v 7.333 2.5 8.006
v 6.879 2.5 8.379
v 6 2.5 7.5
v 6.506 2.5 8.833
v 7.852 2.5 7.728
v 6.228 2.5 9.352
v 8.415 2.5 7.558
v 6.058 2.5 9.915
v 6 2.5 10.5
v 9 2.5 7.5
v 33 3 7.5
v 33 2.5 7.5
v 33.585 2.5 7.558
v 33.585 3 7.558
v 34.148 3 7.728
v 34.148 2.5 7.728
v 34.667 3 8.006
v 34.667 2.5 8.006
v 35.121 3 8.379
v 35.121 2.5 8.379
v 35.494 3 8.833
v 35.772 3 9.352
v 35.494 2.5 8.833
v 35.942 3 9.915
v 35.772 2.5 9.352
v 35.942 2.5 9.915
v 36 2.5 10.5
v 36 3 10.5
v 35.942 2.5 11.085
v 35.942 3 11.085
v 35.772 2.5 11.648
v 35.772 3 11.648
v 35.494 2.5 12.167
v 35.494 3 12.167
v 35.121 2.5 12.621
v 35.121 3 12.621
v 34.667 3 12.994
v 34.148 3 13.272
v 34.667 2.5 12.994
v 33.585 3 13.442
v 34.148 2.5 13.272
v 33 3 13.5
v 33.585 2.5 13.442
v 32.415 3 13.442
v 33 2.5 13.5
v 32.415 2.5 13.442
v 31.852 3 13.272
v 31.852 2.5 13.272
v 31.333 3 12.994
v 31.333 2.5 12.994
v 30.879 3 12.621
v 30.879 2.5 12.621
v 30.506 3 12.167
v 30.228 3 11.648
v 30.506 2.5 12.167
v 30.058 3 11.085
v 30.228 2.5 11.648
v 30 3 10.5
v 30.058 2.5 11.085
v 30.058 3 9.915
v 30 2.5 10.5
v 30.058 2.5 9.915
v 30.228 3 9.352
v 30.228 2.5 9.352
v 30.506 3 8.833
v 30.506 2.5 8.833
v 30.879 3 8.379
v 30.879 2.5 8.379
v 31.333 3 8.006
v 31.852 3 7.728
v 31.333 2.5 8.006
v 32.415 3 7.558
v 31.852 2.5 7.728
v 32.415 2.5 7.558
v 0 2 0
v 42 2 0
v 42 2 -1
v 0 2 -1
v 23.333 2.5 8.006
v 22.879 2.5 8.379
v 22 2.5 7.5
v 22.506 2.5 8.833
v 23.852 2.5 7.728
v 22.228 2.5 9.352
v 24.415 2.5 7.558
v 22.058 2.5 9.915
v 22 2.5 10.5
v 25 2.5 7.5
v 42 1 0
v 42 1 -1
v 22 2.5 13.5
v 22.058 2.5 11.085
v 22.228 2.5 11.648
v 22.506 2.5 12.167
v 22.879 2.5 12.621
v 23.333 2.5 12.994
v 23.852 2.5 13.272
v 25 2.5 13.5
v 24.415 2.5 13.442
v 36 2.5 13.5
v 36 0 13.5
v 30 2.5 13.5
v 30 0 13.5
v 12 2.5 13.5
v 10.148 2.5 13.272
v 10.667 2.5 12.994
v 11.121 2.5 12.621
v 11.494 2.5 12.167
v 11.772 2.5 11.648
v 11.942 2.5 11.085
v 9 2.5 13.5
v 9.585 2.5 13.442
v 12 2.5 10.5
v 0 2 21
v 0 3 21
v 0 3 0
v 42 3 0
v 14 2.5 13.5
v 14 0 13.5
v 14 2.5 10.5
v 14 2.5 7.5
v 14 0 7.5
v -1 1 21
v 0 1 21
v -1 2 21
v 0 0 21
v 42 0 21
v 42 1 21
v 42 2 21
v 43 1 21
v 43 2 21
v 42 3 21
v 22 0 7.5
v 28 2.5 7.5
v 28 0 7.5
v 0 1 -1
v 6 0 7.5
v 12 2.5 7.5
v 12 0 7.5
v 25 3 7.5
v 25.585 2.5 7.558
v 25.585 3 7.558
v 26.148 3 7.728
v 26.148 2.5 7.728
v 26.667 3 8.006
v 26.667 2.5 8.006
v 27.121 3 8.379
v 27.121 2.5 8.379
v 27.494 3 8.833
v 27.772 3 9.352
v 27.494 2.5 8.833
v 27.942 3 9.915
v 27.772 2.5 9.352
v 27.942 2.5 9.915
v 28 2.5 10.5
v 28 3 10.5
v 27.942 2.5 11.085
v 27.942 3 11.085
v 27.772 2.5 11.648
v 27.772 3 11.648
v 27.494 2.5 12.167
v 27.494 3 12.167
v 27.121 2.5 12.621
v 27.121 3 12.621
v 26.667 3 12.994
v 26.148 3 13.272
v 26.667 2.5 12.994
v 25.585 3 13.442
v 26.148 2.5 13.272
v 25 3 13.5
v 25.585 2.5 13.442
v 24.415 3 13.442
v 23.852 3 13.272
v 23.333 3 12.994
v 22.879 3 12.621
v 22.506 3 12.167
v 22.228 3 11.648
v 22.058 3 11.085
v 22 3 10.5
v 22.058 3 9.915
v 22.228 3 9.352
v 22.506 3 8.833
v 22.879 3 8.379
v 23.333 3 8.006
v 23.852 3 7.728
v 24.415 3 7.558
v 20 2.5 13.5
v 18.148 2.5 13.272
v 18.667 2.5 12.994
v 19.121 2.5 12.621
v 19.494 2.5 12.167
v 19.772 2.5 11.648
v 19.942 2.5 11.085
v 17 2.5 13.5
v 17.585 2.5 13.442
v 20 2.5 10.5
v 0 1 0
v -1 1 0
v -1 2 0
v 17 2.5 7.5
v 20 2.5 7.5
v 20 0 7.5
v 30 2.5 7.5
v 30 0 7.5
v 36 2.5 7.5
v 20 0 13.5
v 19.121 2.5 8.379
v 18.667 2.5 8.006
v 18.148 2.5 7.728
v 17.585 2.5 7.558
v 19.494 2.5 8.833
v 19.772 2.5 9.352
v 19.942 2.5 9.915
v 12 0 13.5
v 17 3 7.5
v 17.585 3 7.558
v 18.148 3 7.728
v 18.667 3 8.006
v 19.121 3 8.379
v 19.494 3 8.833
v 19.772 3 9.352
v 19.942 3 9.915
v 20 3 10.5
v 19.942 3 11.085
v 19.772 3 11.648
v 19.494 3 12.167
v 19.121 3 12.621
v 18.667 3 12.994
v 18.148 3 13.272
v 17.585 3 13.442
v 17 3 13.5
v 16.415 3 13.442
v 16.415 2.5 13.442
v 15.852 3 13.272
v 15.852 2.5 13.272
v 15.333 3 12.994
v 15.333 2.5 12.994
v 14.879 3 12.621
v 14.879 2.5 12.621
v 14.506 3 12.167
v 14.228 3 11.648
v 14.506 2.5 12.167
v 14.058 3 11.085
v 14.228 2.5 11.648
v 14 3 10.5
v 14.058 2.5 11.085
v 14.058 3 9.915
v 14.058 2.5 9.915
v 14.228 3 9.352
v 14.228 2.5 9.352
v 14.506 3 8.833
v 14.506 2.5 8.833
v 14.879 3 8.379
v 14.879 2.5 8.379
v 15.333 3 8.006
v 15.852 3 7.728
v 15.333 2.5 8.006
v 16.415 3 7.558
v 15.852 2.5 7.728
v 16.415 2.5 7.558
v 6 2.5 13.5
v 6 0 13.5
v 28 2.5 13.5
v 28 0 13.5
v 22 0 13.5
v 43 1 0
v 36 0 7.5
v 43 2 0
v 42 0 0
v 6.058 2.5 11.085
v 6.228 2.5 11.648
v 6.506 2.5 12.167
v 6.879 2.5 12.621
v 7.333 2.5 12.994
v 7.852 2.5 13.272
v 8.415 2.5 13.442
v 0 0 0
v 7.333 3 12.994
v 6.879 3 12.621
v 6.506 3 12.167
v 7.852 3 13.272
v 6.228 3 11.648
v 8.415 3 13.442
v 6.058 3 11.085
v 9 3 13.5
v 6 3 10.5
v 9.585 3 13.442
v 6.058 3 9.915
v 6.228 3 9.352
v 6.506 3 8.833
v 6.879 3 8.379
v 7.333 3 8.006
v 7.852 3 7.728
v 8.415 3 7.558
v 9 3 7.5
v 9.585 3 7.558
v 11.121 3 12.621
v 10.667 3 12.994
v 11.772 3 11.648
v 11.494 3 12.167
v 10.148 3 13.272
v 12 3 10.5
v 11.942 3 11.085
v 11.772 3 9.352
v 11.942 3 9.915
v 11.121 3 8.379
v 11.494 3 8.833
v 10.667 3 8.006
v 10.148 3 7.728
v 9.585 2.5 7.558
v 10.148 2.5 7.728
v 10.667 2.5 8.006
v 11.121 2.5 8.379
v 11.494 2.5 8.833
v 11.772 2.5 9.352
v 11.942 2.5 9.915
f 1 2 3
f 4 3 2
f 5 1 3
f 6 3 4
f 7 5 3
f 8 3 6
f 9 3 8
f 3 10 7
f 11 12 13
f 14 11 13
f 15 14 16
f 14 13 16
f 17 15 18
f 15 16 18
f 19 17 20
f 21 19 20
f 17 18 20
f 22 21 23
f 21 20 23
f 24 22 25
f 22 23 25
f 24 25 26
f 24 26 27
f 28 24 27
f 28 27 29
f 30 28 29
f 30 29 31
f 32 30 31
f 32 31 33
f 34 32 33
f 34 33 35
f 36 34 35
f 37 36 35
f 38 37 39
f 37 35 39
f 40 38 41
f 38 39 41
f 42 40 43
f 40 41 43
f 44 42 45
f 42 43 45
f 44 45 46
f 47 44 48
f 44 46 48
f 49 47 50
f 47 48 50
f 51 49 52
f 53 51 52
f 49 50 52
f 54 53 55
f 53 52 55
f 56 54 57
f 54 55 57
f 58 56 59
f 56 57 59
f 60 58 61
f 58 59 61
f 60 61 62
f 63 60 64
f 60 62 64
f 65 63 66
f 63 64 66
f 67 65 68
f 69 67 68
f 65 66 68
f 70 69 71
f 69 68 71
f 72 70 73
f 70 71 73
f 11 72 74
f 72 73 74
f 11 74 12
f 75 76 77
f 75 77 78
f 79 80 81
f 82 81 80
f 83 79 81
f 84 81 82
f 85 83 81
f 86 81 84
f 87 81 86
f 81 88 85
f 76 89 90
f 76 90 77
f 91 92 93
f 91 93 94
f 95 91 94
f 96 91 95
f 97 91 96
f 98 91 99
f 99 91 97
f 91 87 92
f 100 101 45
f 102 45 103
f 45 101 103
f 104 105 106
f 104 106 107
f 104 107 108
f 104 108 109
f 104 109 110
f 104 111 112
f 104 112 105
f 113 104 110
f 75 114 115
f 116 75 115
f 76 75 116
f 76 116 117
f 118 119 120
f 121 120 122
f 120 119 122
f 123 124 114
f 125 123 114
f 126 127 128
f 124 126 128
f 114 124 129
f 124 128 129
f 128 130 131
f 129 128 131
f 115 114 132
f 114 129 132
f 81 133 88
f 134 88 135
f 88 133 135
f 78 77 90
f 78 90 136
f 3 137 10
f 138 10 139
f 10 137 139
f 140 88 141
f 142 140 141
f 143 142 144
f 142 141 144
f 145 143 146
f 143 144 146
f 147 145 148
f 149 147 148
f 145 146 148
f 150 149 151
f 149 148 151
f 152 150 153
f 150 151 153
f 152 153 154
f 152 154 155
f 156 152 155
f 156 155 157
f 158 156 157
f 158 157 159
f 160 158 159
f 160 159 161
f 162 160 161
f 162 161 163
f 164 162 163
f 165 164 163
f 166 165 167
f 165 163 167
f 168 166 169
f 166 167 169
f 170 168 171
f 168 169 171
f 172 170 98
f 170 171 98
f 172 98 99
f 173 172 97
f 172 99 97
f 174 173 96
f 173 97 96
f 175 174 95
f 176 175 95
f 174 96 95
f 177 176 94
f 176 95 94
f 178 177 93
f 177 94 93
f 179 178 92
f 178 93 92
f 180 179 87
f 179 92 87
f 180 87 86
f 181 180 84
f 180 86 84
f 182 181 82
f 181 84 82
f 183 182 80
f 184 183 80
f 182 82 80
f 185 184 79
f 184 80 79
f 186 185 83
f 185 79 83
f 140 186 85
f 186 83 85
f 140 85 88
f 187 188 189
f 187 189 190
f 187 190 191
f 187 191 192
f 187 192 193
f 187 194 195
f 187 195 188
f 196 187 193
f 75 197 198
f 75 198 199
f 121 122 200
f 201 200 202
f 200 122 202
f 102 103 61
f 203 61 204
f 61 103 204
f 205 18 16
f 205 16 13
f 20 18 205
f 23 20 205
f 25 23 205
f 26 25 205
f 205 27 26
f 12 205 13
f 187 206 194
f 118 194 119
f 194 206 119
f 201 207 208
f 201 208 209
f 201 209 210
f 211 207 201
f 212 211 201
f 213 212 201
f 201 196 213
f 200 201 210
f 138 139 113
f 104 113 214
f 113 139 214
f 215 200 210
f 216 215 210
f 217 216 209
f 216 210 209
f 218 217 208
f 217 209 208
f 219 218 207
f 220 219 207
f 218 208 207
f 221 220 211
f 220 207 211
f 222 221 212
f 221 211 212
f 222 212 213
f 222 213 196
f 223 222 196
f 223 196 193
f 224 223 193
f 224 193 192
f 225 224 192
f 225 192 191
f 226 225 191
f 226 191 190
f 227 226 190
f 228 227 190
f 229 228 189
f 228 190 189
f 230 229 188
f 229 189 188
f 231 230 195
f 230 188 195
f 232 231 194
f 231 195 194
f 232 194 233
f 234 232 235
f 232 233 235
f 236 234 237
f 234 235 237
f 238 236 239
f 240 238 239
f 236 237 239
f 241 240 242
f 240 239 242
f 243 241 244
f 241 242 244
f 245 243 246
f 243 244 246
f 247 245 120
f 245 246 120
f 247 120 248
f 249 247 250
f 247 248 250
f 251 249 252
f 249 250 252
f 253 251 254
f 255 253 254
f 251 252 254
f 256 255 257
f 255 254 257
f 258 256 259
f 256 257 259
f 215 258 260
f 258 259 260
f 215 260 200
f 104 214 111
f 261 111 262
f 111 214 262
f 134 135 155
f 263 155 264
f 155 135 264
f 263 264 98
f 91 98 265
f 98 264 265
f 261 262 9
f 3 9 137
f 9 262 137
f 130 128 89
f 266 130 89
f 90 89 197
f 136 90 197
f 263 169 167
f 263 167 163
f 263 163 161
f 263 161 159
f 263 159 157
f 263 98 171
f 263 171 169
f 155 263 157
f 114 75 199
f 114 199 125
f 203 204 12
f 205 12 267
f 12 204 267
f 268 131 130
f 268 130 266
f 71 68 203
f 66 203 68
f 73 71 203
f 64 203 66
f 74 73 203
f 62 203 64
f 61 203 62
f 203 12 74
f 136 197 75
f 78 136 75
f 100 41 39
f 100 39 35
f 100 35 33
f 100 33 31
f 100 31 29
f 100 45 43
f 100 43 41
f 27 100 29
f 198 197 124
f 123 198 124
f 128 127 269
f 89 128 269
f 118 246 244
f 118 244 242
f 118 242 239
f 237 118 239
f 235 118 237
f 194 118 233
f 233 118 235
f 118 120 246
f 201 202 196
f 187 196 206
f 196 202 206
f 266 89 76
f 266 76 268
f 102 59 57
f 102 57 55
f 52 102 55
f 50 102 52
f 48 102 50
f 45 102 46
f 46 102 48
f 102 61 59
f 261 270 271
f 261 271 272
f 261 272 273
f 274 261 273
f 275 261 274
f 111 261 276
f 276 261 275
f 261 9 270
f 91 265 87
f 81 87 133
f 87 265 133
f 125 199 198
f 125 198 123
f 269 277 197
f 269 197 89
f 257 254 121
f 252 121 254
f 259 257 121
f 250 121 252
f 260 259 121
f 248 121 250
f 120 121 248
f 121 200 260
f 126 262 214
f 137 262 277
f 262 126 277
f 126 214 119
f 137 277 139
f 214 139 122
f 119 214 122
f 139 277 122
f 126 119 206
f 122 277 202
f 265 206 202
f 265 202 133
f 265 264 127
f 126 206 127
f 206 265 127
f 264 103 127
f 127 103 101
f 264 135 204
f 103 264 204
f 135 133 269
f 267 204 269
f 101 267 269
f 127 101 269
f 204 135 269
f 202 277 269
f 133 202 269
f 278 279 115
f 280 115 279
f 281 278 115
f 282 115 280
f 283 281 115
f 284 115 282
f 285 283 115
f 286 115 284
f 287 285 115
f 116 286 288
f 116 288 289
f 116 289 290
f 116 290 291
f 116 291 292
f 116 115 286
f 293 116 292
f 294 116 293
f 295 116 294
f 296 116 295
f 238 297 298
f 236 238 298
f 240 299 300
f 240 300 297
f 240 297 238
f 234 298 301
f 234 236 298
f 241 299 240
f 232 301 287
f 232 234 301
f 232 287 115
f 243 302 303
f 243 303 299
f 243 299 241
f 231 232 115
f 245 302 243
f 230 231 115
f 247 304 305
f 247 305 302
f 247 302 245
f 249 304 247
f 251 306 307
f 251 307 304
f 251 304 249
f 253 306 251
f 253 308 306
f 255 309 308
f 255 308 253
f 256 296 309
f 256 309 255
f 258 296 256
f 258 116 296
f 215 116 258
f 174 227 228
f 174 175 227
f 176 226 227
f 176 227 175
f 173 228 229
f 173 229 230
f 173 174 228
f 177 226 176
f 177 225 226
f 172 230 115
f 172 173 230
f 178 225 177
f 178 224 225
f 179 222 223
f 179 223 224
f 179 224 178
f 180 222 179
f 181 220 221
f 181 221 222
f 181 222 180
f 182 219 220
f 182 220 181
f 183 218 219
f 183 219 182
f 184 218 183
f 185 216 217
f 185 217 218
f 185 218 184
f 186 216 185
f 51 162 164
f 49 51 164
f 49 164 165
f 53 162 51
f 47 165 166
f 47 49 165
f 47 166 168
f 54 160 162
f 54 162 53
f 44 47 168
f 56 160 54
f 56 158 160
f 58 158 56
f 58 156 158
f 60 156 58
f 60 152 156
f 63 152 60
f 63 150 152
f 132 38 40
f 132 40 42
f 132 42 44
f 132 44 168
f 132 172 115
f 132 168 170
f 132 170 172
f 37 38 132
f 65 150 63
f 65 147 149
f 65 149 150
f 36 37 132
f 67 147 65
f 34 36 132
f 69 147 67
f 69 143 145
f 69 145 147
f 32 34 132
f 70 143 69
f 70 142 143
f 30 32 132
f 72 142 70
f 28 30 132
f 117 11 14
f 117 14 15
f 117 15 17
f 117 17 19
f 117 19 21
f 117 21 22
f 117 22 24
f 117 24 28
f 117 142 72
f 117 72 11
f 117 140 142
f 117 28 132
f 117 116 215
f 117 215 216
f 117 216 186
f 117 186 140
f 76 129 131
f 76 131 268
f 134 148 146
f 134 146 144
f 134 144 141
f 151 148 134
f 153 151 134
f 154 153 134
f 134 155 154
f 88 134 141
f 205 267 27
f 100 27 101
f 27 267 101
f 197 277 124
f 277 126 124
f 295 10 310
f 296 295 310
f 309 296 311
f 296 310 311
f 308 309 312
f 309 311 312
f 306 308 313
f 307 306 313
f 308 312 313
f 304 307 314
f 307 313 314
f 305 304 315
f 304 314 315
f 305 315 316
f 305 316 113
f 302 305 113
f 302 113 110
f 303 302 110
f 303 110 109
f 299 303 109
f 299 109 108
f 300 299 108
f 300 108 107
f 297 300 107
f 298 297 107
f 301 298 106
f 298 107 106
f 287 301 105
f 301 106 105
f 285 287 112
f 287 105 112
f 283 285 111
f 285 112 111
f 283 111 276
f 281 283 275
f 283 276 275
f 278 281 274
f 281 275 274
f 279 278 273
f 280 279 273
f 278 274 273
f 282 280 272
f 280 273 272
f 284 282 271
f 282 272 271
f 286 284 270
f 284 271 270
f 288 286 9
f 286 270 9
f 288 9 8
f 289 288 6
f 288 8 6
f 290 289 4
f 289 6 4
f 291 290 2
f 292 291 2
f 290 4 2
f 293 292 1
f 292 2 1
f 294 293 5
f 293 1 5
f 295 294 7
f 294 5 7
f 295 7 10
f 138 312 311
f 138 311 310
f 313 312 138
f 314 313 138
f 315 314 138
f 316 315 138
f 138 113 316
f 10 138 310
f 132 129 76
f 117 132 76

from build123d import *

# Parameters (mm, degrees)
SKETCH_1_W          = 42
SKETCH_1_H          = 21
EXTRUDE_1_DEPTH     = 3
SKETCH_2_R          = 3
CUT_EXTRUDE_4_DEPTH = 3
CUT_EXTRUDE_6_DEPTH = 2.5
SKETCH_5_W          = 21
SKETCH_5_H          = 1
EXTRUDE_2_DEPTH     = 1
SKETCH_7_W          = 42
SKETCH_7_H          = 1
EXTRUDE_3_DEPTH     = 1
SKETCH_8_W          = 21
SKETCH_8_H          = 1
EXTRUDE_4_DEPTH     = 1


with BuildPart() as part:
    # Эскиз1 → Бобышка-Вытянуть1 (new body)
    with BuildSketch(Plane(origin=(0, 0, 0), x_dir=(1, 0, 0), z_dir=(0, 1, 0))):
        with Locations((21, -10.5)):
            Rectangle(SKETCH_1_W, SKETCH_1_H)
    extrude(amount=EXTRUDE_1_DEPTH)

    # Эскиз2 → Вырез-Вытянуть4 (cut)
    with BuildSketch(Plane.XZ):
        with Locations((17, 10.5)):
            Circle(SKETCH_2_R)
        with Locations((9, 10.5)):
            Circle(SKETCH_2_R)
        with Locations((25, 10.5)):
            Circle(SKETCH_2_R)
        with Locations((33, 10.5)):
            Circle(SKETCH_2_R)
    extrude(amount=-CUT_EXTRUDE_4_DEPTH, mode=Mode.SUBTRACT)

    # Эскиз2<5> → Вырез-Вытянуть6 (cut)
    with BuildSketch(Plane.XZ):
        with BuildLine():
            Line((17, 13.5), (14, 13.5))
            Line((14, 13.5), (14, 10.5))
            ThreePointArc((14, 10.5), (14.878679656, 12.621320344), (17, 13.5))
        make_face()
        with BuildLine():
            Line((20, 13.5), (17, 13.5))
            ThreePointArc((17, 13.5), (19.121320344, 12.621320344), (20, 10.5))
            Line((20, 10.5), (20, 13.5))
        make_face()
        with BuildLine():
            ThreePointArc((17, 7.5), (14.878679656, 8.378679656), (14, 10.5))
            Line((14, 10.5), (14, 7.5))
            Line((14, 7.5), (17, 7.5))
        make_face()
        with BuildLine():
            Line((20, 7.5), (20, 10.5))
            ThreePointArc((20, 10.5), (19.121320344, 8.378679656), (17, 7.5))
            Line((17, 7.5), (20, 7.5))
        make_face()
        with BuildLine():
            Line((9, 13.5), (6, 13.5))
            Line((6, 13.5), (6, 10.5))
            ThreePointArc((6, 10.5), (6.878679656, 12.621320344), (9, 13.5))
        make_face()
        with BuildLine():
            Line((12, 13.5), (9, 13.5))
            ThreePointArc((9, 13.5), (11.121320344, 12.621320344), (12, 10.5))
            Line((12, 10.5), (12, 13.5))
        make_face()
        with BuildLine():
            ThreePointArc((9, 7.5), (6.878679656, 8.378679656), (6, 10.5))
            Line((6, 10.5), (6, 7.5))
            Line((6, 7.5), (9, 7.5))
        make_face()
        with BuildLine():
            Line((12, 7.5), (12, 10.5))
            ThreePointArc((12, 10.5), (11.121320344, 8.378679656), (9, 7.5))
            Line((9, 7.5), (12, 7.5))
        make_face()
        with BuildLine():
            Line((25, 13.5), (22, 13.5))
            Line((22, 13.5), (22, 10.5))
            ThreePointArc((22, 10.5), (22.878679656, 12.621320344), (25, 13.5))
        make_face()
        with BuildLine():
            Line((28, 13.5), (25, 13.5))
            ThreePointArc((25, 13.5), (27.121320344, 12.621320344), (28, 10.5))
            Line((28, 10.5), (28, 13.5))
        make_face()
        with BuildLine():
            ThreePointArc((25, 7.5), (22.878679656, 8.378679656), (22, 10.5))
            Line((22, 10.5), (22, 7.5))
            Line((22, 7.5), (25, 7.5))
        make_face()
        with BuildLine():
            Line((28, 7.5), (28, 10.5))
            ThreePointArc((28, 10.5), (27.121320344, 8.378679656), (25, 7.5))
            Line((25, 7.5), (28, 7.5))
        make_face()
        with BuildLine():
            Line((33, 13.5), (30, 13.5))
            Line((30, 13.5), (30, 10.5))
            ThreePointArc((30, 10.5), (30.878679656, 12.621320344), (33, 13.5))
        make_face()
        with BuildLine():
            Line((36, 13.5), (33, 13.5))
            ThreePointArc((33, 13.5), (35.121320344, 12.621320344), (36, 10.5))
            Line((36, 10.5), (36, 13.5))
        make_face()
        with BuildLine():
            ThreePointArc((33, 7.5), (30.878679656, 8.378679656), (30, 10.5))
            Line((30, 10.5), (30, 7.5))
            Line((30, 7.5), (33, 7.5))
        make_face()
        with BuildLine():
            Line((36, 7.5), (36, 10.5))
            ThreePointArc((36, 10.5), (35.121320344, 8.378679656), (33, 7.5))
            Line((33, 7.5), (36, 7.5))
        make_face()
    extrude(amount=-CUT_EXTRUDE_6_DEPTH, mode=Mode.SUBTRACT)

    # Эскиз5 → Бобышка-Вытянуть2 (add)
    with BuildSketch(Plane(origin=(42, 0, 0), x_dir=(0, 0, -1), z_dir=(1, 0, 0))):
        with Locations((-10.5, 1.5)):
            Rectangle(SKETCH_5_W, SKETCH_5_H)
    extrude(amount=EXTRUDE_2_DEPTH)

    # Эскиз7 → Бобышка-Вытянуть3 (add)
    with BuildSketch(Plane(origin=(0, 0, 0), x_dir=(-1, 0, 0), z_dir=(0, 0, -1))):
        with Locations((-21, 1.5)):
            Rectangle(SKETCH_7_W, SKETCH_7_H)
    extrude(amount=EXTRUDE_3_DEPTH)

    # Эскиз8 → Бобышка-Вытянуть4 (add)
    with BuildSketch(Plane.ZY):
        with Locations((10.5, 1.5)):
            Rectangle(SKETCH_8_W, SKETCH_8_H)
    extrude(amount=EXTRUDE_4_DEPTH)


solid = part.part
